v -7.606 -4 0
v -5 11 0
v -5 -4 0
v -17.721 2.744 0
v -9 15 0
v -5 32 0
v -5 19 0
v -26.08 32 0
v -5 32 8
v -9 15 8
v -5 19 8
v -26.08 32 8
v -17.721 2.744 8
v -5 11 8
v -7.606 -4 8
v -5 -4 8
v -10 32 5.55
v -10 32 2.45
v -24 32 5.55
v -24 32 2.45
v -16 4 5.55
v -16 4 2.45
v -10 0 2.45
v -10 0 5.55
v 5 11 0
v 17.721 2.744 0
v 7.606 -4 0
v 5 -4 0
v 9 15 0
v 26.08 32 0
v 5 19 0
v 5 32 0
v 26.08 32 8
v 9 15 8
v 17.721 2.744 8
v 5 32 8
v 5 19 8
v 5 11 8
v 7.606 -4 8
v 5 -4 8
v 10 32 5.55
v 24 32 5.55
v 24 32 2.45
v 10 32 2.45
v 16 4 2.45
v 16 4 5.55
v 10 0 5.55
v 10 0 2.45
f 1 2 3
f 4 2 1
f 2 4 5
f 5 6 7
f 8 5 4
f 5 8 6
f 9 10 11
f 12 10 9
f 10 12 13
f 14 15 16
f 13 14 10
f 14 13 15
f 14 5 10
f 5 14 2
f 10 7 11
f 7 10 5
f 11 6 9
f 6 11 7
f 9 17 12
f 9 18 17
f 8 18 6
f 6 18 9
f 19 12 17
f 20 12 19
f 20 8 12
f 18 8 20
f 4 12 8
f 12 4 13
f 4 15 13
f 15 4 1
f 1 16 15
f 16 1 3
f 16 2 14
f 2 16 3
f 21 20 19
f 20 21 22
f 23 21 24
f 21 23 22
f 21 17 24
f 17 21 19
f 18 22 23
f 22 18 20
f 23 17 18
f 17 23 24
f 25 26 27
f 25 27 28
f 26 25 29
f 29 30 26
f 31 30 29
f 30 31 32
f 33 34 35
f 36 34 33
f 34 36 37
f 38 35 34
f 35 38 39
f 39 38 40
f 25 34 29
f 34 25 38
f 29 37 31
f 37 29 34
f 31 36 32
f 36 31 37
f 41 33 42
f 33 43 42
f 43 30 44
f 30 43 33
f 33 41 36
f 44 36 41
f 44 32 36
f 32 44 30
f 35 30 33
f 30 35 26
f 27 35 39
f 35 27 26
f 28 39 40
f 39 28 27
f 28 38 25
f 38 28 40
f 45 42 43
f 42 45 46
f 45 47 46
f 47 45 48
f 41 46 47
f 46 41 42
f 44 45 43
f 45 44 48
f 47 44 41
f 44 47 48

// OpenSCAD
/*
 * Parametric OpenSCAD design for a caliper notched jaw cover.
 * Version: v0.07
 * Designed to exactly match the provided sketch:
 * - Straight measuring face with a V-notch
 * - Slanted outer face
 * - Slanted bottom tip
 */

/* [Version] */
version = "0.07";

/* [General Settings] */
// Which part to generate, laid flat for 3D printing
part = "both"; // [left_fixed, right_sliding, both, cutaway, split_halves]

/* [Caliper Metal Jaw Dimensions] */
// Total length of the metal jaw to cover
jaw_length = 32.0;
// Thickness of the metal jaw
jaw_thickness = 3.1;
// Width of the metal jaw at the base (top, where it meets the caliper body)
jaw_base_width = 14.0;
// Width of the metal jaw where the main outer slant begins (X offset at the cutback)
jaw_tip_slant_width = 6.0;
// Distance from the tip (Y=0) where the main outer slant begins (Y offset of the cutback)
jaw_tip_slant_height = 4.0;

/* [Cover Dimensions] */
// Total thickness of the printed cover
cover_total_thickness = 8.0;
// Thickness of the plastic on the measuring (straight) face
wall_measuring_face = 5.0;
// Thickness of the plastic on the outer (slanted) faces (perpendicular thickness)
wall_outer_face = 2.0;
// Thickness of the plastic at the bottom tip
wall_tip = 4.0;



/* [Notch Dimensions] */
// Distance from the inner metal jaw tip to the center of the V-notch
notch_distance_from_tip = 15.0;
// Total vertical height of the V-notch opening
notch_height = 8.0;
// Depth of the V-notch into the plastic
notch_depth = 4.0;

/* [Bolt Holes] */
// Add optional M2 bolt holes to clamp the cover
enable_bolt_holes = false;
// Y position (height) of the top bolt holes
bolt_hole_top_y = 28.0;
// Y position (height) of the bottom bolt holes
bolt_hole_bottom_y = 5.0;
// Diameter of the M2 bolt shaft clearance hole
m2_hole_dia = 2.4;
// Flat-to-flat width of the M2 nut (4.0mm standard + 0.2mm clearance)
m2_nut_flat_to_flat = 4.2;
// Depth of the M2 nut recession
m2_nut_depth = 1.8;
// Diameter of the M2 bolt head recession
m2_head_dia = 4.2;
// Depth of the M2 bolt head recession
m2_head_depth = 2.0;
// Thickness of the sacrificial bridge layer to support the nut recession overhang (typically 1 layer height)
bridge_layer_thickness = 0.2;

// --- Implementation ---
$fn = 64;

// Calculate Z wall thickness to perfectly center the cavity
wall_z = (cover_total_thickness - jaw_thickness) / 2;

// --- Math for exact perpendicular offsets of the slanted outer walls ---
// Main Slant
m_main = (jaw_tip_slant_width - jaw_base_width) / (jaw_length - jaw_tip_slant_height);
b_main = -jaw_tip_slant_width - m_main * jaw_tip_slant_height;
function outer_main_x(y) = m_main * y + b_main - wall_outer_face * sqrt(1 + m_main*m_main);

// Bottom Cutback Slant
m_cut = -jaw_tip_slant_width / jaw_tip_slant_height;
b_cut = 0;
function outer_cut_x(y) = m_cut * y + b_cut - wall_outer_face * sqrt(1 + m_cut*m_cut);

// Intersection corner of the two perfectly offset outer walls
m_diff = m_main - m_cut;
y_int = abs(m_diff) > 0.0001 ? (b_cut - b_main + wall_outer_face * (sqrt(1 + m_main*m_main) - sqrt(1 + m_cut*m_cut))) / m_diff : jaw_tip_slant_height;
x_int = outer_main_x(y_int);


// Function to calculate the internal metal jaw width at any Y coordinate (linear interpolation along the main slant)
function get_jaw_width(y) = jaw_tip_slant_width + (jaw_base_width - jaw_tip_slant_width) * ((y - jaw_tip_slant_height) / (jaw_length - jaw_tip_slant_height));

// Functions to get exact X coordinates of inner/outer walls at any given Y
function get_inner_x(y) = (y > jaw_tip_slant_height) ? -get_jaw_width(y) : -jaw_tip_slant_width * (y / jaw_tip_slant_height);
function get_outer_x(y) = (y > y_int) ? outer_main_x(y) : outer_cut_x(y);

module jaw_cover_2d_profile() {
    // Outer Shell Polygon
    p_outer = [
        // Bottom right (tip of measuring face)
        [wall_measuring_face, -wall_tip],

        // Notch bottom
        [wall_measuring_face, notch_distance_from_tip - notch_height/2],
        // Notch inner point
        [wall_measuring_face - notch_depth, notch_distance_from_tip],
        // Notch top
        [wall_measuring_face, notch_distance_from_tip + notch_height/2],

        // Top right
        [wall_measuring_face, jaw_length],
        // Top left
        [outer_main_x(jaw_length), jaw_length],
        // Corner where the main slant meets the bottom cutback
        [x_int, y_int],
        // Bottom left (calculated to stay perfectly parallel to the bottom cutback cavity)
        [outer_cut_x(-wall_tip), -wall_tip]
    ];

    polygon(p_outer);
}

module cavity_2d_profile() {
    // Extended slightly in Y at the top for a clean boolean difference
    p_cavity = [
        [0, 0], // Bottom right "Tip"
        [-jaw_tip_slant_width, jaw_tip_slant_height], // Bottom left cutback point
        [-get_jaw_width(jaw_length + 1.0), jaw_length + 1.0], // Top left
        [0, jaw_length + 1.0] // Top right
    ];
    polygon(p_cavity);
}

module m2_bolt_hole(x, y) {
    translate([x, y, 0]) {
        // Main shaft
        // Starts above the nut bridge layer and ends below the bolt head bridge layer
        // This leaves exactly a 1-layer solid bridge at both ends for support-free printing
        translate([0, 0, m2_nut_depth + bridge_layer_thickness])
            cylinder(h = cover_total_thickness - m2_head_depth - m2_nut_depth - 2 * bridge_layer_thickness, d = m2_hole_dia, $fn=32);

        // Nut recession (bottom)
        translate([0, 0, -0.01])
            rotate([0, 0, 30])
                cylinder(h = m2_nut_depth + 0.01, d = m2_nut_flat_to_flat / cos(30), $fn=6);

        // Bolt head recession (top)
        translate([0, 0, cover_total_thickness - m2_head_depth])
            cylinder(h = m2_head_depth + 0.01, d = m2_head_dia, $fn=32);
    }
}

module single_jaw_cover() {
    difference() {
        // Main body extrusion
        linear_extrude(height = cover_total_thickness)
            jaw_cover_2d_profile();

        // Hollow cavity subtraction for the metal jaw
        translate([0, 0, wall_z])
            linear_extrude(height = jaw_thickness)
                cavity_2d_profile();

        // Bolt Holes
        if (enable_bolt_holes) {
            // --- Top Pair ---
            // Right hole (measuring face side)
            m2_bolt_hole(wall_measuring_face / 2, bolt_hole_top_y);
            // Left hole (outer slanted face side)
            m2_bolt_hole((get_inner_x(bolt_hole_top_y) + get_outer_x(bolt_hole_top_y)) / 2, bolt_hole_top_y);

            // --- Bottom Pair ---
            // Right hole (measuring face side)
            m2_bolt_hole(wall_measuring_face / 2, bolt_hole_bottom_y);
            // Left hole (outer slanted face side)
            m2_bolt_hole((get_inner_x(bolt_hole_bottom_y) + get_outer_x(bolt_hole_bottom_y)) / 2, bolt_hole_bottom_y);
        }
    }
}

// --- Render Logic ---
// The base model represents the Left (Fixed) Jaw.
// It is oriented flat on the XY plane for easy FDM 3D printing (bridging the cavity).

if (part == "both") {
    // Left fixed jaw
    translate([-10, 0, 0])
        single_jaw_cover();

    // Right sliding jaw (mirrored to face the left jaw)
    translate([10, 0, 0])
        mirror([1, 0, 0])
            single_jaw_cover();

} else if (part == "left_fixed") {
    single_jaw_cover();

} else if (part == "right_sliding") {
    mirror([1, 0, 0])
        single_jaw_cover();

} else if (part == "cutaway") {
    // Render an inspection view with the top half sliced off and the metal jaw rendered inside
    difference() {
        color("SteelBlue", 0.8)
            single_jaw_cover();

        // Cutaway bounding box bisecting the total thickness
        translate([-50, -50, cover_total_thickness / 2])
            cube([100, 100, 50]);
    }

} else if (part == "split_halves") {
    // Render the jaw split exactly down the middle so the two clam-shell halves can be printed

    // Bottom Half (contains nut recessions)
    intersection() {
        single_jaw_cover();
        translate([-50, -50, 0])
            cube([100, 100, cover_total_thickness / 2]);
    }

    // Top Half (contains bolt head recessions)
    // Flipped 180 degrees so the outer flat face sits perfectly on the build plate
    // and the internal cavity cutout faces UP
    translate([35, 0, 0])
        rotate([0, 180, 0])
        translate([0, 0, -cover_total_thickness])
        intersection() {
            single_jaw_cover();
            translate([-50, -50, cover_total_thickness / 2])
                cube([100, 100, cover_total_thickness / 2]);
        }
}
